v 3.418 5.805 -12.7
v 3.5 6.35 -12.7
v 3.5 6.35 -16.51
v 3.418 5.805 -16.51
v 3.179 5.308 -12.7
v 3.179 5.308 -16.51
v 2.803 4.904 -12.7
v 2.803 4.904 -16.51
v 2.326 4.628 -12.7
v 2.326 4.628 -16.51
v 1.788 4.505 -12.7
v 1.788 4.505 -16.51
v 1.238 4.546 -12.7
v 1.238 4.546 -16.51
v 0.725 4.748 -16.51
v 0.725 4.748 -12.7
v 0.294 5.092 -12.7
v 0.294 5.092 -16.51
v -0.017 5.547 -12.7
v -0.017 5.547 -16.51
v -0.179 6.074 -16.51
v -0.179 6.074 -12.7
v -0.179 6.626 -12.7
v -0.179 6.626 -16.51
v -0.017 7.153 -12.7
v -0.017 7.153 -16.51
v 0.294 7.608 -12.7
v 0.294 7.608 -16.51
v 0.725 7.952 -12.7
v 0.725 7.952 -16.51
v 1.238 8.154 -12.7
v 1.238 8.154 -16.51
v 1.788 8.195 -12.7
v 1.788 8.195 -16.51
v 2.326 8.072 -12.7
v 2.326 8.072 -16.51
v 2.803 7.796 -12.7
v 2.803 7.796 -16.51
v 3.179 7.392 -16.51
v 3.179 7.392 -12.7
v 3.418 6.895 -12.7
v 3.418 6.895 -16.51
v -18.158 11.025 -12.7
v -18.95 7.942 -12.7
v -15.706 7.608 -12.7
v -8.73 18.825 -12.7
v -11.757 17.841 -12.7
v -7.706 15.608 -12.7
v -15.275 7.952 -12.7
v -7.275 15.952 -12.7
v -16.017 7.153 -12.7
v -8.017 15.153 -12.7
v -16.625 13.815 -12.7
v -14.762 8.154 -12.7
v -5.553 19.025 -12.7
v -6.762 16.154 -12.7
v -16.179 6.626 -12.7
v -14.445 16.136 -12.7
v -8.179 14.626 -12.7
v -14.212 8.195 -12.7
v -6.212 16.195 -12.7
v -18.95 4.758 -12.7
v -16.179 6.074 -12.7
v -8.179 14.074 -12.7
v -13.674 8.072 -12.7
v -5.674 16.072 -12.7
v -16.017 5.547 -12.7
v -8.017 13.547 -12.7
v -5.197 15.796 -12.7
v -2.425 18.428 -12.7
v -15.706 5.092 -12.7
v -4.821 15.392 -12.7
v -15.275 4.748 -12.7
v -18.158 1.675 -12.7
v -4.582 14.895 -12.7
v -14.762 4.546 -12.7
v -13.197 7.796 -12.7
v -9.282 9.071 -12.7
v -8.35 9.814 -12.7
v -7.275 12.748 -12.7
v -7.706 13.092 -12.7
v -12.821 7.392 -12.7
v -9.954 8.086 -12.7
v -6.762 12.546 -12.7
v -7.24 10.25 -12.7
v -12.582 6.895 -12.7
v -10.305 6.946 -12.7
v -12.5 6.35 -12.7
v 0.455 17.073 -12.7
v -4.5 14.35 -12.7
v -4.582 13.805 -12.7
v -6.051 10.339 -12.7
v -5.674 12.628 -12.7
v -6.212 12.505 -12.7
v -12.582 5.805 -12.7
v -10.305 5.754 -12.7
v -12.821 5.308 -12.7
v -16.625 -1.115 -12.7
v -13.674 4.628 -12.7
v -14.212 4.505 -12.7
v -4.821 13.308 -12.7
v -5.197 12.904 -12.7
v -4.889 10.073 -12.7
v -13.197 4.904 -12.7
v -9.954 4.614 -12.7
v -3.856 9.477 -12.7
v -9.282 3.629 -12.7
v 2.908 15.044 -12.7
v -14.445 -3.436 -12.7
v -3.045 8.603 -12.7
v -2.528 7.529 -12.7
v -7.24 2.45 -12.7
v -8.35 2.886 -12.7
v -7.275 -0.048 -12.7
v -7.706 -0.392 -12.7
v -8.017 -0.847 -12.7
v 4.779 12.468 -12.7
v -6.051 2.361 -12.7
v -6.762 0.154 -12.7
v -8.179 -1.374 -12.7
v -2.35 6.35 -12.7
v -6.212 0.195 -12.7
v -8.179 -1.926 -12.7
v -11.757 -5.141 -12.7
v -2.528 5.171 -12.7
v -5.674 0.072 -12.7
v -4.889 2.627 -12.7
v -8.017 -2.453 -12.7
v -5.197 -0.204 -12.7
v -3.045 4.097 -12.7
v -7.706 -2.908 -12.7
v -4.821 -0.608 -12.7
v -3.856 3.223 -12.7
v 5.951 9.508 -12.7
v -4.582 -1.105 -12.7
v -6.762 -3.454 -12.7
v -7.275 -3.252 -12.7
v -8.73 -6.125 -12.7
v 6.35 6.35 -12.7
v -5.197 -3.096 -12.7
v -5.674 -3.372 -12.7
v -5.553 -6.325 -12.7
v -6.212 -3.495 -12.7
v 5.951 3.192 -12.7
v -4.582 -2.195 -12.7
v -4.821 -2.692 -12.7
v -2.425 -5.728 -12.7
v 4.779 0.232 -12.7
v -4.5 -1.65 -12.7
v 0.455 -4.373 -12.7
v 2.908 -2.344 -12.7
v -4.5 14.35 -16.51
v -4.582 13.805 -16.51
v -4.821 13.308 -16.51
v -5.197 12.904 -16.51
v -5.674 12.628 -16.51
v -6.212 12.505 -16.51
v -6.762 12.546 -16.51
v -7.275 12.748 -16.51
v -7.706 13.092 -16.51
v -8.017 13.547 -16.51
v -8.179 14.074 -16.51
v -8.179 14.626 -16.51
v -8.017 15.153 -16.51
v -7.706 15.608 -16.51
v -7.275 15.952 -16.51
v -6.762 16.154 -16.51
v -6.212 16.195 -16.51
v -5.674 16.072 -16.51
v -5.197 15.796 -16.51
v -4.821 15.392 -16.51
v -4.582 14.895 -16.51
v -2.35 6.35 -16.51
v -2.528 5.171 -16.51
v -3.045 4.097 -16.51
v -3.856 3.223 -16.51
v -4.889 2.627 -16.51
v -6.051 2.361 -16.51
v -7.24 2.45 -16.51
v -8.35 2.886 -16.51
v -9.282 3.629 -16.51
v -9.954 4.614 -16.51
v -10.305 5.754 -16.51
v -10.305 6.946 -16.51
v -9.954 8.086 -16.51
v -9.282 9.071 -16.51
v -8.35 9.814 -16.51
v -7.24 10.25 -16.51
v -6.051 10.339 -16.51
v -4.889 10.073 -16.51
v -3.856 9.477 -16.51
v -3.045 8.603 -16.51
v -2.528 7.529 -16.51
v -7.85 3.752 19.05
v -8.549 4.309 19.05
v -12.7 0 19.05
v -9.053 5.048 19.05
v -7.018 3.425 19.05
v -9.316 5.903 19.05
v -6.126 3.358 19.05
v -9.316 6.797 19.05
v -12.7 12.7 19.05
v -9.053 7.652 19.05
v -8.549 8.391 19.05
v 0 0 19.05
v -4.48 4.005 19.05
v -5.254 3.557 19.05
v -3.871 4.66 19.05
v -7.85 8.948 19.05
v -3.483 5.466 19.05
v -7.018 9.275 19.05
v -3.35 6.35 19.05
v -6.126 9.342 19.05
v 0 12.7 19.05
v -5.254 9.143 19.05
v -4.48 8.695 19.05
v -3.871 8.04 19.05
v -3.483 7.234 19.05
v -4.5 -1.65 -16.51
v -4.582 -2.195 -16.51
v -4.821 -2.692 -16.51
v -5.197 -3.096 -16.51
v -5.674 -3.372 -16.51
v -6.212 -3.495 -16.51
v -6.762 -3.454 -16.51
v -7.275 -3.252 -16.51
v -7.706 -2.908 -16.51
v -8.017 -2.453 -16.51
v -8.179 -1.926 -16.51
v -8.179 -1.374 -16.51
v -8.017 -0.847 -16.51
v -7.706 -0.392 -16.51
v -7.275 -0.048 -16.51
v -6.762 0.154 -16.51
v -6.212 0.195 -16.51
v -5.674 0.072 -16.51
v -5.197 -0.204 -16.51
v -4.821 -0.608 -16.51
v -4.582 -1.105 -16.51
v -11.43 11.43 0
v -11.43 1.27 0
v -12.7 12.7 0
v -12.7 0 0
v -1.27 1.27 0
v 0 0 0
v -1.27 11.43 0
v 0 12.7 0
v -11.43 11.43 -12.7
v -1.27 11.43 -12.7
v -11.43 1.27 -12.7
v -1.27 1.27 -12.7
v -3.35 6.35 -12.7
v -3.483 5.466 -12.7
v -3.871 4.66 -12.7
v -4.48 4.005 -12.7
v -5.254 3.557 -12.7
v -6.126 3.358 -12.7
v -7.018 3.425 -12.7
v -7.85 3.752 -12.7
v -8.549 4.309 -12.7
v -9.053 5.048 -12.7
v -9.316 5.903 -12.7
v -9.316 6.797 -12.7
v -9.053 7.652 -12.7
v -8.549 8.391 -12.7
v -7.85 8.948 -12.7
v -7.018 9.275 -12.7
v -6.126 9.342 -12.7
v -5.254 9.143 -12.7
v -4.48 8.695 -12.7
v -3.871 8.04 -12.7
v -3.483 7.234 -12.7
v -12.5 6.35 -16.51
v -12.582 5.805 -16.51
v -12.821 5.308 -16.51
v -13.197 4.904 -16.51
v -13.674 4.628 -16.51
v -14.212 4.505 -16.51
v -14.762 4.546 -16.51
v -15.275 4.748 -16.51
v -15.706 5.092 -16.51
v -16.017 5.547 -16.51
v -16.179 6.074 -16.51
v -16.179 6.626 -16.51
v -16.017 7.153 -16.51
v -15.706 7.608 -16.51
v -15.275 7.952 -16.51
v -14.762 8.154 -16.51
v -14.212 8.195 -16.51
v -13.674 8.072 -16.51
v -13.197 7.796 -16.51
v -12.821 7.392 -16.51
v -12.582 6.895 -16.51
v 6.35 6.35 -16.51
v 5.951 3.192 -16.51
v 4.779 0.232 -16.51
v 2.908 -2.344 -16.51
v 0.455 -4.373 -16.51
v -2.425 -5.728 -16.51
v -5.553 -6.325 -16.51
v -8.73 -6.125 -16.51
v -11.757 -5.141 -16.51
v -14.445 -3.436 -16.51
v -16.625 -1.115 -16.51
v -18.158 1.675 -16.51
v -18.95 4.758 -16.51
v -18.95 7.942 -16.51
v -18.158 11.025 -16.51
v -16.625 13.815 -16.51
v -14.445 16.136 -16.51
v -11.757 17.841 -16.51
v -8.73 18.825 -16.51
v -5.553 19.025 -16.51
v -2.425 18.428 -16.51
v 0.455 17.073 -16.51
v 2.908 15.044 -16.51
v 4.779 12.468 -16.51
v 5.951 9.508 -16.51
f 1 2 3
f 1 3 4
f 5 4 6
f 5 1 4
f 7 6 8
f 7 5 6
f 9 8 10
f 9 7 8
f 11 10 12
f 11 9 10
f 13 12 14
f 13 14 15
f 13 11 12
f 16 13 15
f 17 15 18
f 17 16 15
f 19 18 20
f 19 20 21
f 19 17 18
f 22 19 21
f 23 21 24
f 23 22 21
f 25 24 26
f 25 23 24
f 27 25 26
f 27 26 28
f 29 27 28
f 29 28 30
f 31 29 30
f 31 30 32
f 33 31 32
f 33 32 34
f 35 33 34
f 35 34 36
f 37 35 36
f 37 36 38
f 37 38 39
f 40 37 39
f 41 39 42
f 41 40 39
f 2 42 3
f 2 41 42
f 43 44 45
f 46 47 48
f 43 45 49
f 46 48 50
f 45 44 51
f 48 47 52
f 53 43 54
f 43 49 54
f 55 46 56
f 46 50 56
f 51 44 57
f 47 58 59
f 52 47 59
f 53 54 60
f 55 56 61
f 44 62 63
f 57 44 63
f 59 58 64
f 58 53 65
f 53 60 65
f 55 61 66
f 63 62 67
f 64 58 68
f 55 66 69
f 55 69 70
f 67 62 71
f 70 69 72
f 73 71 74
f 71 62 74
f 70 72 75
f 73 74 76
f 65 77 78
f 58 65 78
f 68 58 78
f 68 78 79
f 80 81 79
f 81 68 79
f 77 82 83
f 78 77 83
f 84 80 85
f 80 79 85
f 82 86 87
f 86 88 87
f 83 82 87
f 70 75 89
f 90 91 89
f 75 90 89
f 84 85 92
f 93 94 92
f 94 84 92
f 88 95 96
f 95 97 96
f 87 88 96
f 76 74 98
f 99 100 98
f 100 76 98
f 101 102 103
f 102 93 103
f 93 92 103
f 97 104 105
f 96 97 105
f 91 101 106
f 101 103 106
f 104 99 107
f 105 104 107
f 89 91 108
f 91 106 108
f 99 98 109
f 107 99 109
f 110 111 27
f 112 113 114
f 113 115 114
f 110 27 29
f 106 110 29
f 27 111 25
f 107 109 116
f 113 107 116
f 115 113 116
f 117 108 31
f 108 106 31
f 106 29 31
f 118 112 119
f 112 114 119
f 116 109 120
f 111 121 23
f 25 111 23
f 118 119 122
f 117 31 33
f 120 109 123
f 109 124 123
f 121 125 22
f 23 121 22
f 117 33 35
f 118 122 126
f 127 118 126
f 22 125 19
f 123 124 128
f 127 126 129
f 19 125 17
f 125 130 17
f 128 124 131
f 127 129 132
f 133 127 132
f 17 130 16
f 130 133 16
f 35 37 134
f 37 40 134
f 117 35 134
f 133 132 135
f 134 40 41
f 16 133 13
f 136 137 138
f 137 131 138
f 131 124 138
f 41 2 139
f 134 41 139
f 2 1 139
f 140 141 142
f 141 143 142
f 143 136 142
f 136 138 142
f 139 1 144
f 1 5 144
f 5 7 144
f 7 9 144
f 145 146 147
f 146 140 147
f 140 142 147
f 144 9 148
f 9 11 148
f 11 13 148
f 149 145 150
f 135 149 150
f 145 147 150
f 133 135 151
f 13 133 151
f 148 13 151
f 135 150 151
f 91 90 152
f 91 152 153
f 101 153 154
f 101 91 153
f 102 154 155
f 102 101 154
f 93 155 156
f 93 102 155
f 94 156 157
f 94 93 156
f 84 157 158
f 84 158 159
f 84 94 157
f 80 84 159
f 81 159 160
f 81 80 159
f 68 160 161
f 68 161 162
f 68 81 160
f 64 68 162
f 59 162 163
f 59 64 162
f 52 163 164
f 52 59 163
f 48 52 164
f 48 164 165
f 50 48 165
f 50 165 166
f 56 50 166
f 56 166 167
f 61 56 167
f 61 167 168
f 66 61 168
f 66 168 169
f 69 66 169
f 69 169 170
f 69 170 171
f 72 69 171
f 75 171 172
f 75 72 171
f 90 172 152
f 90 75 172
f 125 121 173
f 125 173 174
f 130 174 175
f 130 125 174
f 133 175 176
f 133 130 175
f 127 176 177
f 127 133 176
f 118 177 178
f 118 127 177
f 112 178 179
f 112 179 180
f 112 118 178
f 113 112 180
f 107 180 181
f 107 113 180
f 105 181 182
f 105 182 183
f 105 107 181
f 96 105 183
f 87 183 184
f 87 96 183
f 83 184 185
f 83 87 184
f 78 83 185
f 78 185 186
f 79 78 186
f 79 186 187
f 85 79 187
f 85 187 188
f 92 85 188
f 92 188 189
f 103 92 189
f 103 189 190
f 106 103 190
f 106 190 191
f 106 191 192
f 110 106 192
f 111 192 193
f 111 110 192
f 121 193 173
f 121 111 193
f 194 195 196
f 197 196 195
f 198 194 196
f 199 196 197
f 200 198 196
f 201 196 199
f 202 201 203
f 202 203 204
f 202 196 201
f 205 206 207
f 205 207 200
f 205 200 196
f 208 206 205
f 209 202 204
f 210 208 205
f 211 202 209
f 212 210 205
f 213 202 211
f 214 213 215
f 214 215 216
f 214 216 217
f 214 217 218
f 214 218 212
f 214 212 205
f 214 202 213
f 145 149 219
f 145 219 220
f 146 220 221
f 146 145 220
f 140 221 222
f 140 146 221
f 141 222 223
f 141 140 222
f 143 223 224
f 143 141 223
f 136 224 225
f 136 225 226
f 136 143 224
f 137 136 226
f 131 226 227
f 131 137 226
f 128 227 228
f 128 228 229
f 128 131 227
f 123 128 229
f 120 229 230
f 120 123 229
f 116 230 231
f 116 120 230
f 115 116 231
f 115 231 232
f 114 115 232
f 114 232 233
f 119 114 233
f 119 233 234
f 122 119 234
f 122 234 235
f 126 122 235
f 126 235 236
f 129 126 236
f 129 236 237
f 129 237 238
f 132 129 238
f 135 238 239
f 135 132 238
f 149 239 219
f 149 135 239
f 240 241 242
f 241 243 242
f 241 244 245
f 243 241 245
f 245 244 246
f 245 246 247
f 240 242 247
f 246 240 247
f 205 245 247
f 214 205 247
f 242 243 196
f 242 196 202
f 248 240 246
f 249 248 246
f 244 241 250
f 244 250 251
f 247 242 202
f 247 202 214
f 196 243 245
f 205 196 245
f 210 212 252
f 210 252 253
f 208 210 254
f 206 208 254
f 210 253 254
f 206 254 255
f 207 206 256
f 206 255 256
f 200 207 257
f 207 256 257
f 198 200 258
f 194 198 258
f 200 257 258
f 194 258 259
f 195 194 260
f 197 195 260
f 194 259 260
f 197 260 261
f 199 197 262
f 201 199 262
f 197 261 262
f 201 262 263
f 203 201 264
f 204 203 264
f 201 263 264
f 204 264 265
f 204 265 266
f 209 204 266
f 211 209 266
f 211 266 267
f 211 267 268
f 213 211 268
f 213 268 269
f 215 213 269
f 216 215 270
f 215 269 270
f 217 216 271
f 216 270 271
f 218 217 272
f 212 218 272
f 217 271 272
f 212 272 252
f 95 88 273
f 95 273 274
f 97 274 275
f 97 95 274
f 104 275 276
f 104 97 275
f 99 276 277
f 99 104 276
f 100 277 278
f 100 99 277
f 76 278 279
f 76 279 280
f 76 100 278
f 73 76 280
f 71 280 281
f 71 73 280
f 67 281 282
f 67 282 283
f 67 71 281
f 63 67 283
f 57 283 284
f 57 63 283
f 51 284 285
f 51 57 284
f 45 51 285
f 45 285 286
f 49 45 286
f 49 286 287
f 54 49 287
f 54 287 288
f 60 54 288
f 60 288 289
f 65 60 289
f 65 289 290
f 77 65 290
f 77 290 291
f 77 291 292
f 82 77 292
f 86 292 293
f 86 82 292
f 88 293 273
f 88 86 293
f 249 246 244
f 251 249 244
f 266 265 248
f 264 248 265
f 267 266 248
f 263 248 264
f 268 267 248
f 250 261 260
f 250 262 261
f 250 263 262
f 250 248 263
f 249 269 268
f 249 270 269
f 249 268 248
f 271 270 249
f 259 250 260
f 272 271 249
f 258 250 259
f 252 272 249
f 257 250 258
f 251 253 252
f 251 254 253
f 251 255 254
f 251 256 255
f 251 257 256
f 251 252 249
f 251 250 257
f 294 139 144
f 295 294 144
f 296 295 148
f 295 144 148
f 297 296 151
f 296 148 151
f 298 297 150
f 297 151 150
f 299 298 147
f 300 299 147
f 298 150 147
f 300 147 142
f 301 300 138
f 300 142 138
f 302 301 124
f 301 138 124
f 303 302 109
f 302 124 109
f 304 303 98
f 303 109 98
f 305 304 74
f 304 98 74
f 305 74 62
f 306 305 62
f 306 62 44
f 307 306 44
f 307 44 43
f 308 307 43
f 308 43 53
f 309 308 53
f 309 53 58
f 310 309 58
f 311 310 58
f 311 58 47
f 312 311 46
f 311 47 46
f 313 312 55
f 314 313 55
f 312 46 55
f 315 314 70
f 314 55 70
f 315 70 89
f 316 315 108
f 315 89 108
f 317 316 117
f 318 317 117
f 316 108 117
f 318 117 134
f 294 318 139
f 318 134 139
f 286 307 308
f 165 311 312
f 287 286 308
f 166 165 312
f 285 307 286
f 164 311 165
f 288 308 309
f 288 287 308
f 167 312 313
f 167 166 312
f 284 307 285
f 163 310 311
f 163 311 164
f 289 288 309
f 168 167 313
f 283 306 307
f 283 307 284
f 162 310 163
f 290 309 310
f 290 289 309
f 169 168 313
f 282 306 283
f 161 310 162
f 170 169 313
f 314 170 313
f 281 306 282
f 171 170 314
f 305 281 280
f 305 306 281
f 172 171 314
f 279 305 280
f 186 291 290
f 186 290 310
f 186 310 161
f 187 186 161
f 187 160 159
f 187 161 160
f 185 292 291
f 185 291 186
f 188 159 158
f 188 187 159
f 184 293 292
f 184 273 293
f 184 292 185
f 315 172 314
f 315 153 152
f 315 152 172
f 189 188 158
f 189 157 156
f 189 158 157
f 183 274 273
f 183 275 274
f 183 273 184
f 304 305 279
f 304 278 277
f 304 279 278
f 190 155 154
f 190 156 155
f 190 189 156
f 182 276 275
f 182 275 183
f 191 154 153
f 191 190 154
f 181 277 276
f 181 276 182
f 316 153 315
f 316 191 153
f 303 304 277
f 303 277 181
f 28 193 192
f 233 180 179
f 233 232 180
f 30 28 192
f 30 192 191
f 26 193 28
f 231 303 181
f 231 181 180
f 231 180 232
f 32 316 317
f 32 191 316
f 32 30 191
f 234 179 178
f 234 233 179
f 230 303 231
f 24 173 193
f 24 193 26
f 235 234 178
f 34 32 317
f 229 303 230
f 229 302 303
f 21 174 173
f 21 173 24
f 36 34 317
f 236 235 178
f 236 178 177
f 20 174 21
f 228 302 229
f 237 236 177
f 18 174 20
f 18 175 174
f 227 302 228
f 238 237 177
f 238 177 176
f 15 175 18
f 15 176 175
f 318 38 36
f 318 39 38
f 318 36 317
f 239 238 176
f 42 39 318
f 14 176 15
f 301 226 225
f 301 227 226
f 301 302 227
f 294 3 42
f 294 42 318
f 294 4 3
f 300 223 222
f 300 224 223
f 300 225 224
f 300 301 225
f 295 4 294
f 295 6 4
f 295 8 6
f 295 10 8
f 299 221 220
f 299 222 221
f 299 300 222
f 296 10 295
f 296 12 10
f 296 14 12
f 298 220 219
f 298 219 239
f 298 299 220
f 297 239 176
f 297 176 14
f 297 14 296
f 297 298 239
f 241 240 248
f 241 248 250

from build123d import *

# Parameters (mm, degrees)
F0_W      = 12.7
F0_H      = 12.7
F1_DEPTH  = 19.05
F2_W      = 10.16
F2_H      = 10.16
F2_R      = 3
F3_DEPTH  = 12.7
F4_R      = 12.7
F4_R_2    = 1.85
F4_W      = 10.16
F4_H      = 10.16
F4_R_3    = 4
F5_DEPTH  = 3.81
F3_FACE_R = 3
F6_DEPTH  = 127


with BuildPart() as f1:
    # F0 (on Top) → F1 (new body)
    with BuildSketch(Plane.XY):
        with Locations((-6.35, 6.35)):
            Rectangle(F0_W, F0_H)
    extrude(amount=F1_DEPTH)

    # F2 (on face) → F3 (join)
    with BuildSketch(Plane(origin=(0, 0, 0), x_dir=(1, 0, 0), z_dir=(0, 0, -1))):
        with Locations((-6.35, -6.35)):
            Rectangle(F2_W, F2_H)
        with Locations((-6.35, -6.35)):
            Circle(F2_R, mode=Mode.SUBTRACT)
    extrude(amount=F3_DEPTH)

    # F3_face (on face) → F6 (cut)
    with BuildSketch(Plane(origin=(-6.35, 6.35, -12.7), x_dir=(1, 0, 0), z_dir=(0, 0, -1))):
        Circle(F3_FACE_R)
    extrude(amount=-F6_DEPTH, mode=Mode.SUBTRACT)


with BuildPart() as f5:
    # F4 (on face) → F5 (new body)
    with BuildSketch(Plane(origin=(0, 0, -12.7), x_dir=(1, 0, 0), z_dir=(0, 0, -1))):
        with Locations((-6.35, -6.35)):
            Circle(F4_R)
        with Locations((-6.35, -14.35)):
            Circle(F4_R_2, mode=Mode.SUBTRACT)
        with Locations((-14.35, -6.35)):
            Circle(F4_R_2, mode=Mode.SUBTRACT)
        with Locations((-6.35, -6.35)):
            Rectangle(F4_W, F4_H, mode=Mode.SUBTRACT)
        with Locations((1.65, -6.35)):
            Circle(F4_R_2, mode=Mode.SUBTRACT)
        with Locations((-6.35, 1.65)):
            Circle(F4_R_2, mode=Mode.SUBTRACT)
        with Locations((-6.35, -6.35)):
            Rectangle(F4_W, F4_H)
        with Locations((-6.35, -6.35)):
            Circle(F4_R_3, mode=Mode.SUBTRACT)
    extrude(amount=F5_DEPTH)


solid = Compound([f1.part, f5.part])
